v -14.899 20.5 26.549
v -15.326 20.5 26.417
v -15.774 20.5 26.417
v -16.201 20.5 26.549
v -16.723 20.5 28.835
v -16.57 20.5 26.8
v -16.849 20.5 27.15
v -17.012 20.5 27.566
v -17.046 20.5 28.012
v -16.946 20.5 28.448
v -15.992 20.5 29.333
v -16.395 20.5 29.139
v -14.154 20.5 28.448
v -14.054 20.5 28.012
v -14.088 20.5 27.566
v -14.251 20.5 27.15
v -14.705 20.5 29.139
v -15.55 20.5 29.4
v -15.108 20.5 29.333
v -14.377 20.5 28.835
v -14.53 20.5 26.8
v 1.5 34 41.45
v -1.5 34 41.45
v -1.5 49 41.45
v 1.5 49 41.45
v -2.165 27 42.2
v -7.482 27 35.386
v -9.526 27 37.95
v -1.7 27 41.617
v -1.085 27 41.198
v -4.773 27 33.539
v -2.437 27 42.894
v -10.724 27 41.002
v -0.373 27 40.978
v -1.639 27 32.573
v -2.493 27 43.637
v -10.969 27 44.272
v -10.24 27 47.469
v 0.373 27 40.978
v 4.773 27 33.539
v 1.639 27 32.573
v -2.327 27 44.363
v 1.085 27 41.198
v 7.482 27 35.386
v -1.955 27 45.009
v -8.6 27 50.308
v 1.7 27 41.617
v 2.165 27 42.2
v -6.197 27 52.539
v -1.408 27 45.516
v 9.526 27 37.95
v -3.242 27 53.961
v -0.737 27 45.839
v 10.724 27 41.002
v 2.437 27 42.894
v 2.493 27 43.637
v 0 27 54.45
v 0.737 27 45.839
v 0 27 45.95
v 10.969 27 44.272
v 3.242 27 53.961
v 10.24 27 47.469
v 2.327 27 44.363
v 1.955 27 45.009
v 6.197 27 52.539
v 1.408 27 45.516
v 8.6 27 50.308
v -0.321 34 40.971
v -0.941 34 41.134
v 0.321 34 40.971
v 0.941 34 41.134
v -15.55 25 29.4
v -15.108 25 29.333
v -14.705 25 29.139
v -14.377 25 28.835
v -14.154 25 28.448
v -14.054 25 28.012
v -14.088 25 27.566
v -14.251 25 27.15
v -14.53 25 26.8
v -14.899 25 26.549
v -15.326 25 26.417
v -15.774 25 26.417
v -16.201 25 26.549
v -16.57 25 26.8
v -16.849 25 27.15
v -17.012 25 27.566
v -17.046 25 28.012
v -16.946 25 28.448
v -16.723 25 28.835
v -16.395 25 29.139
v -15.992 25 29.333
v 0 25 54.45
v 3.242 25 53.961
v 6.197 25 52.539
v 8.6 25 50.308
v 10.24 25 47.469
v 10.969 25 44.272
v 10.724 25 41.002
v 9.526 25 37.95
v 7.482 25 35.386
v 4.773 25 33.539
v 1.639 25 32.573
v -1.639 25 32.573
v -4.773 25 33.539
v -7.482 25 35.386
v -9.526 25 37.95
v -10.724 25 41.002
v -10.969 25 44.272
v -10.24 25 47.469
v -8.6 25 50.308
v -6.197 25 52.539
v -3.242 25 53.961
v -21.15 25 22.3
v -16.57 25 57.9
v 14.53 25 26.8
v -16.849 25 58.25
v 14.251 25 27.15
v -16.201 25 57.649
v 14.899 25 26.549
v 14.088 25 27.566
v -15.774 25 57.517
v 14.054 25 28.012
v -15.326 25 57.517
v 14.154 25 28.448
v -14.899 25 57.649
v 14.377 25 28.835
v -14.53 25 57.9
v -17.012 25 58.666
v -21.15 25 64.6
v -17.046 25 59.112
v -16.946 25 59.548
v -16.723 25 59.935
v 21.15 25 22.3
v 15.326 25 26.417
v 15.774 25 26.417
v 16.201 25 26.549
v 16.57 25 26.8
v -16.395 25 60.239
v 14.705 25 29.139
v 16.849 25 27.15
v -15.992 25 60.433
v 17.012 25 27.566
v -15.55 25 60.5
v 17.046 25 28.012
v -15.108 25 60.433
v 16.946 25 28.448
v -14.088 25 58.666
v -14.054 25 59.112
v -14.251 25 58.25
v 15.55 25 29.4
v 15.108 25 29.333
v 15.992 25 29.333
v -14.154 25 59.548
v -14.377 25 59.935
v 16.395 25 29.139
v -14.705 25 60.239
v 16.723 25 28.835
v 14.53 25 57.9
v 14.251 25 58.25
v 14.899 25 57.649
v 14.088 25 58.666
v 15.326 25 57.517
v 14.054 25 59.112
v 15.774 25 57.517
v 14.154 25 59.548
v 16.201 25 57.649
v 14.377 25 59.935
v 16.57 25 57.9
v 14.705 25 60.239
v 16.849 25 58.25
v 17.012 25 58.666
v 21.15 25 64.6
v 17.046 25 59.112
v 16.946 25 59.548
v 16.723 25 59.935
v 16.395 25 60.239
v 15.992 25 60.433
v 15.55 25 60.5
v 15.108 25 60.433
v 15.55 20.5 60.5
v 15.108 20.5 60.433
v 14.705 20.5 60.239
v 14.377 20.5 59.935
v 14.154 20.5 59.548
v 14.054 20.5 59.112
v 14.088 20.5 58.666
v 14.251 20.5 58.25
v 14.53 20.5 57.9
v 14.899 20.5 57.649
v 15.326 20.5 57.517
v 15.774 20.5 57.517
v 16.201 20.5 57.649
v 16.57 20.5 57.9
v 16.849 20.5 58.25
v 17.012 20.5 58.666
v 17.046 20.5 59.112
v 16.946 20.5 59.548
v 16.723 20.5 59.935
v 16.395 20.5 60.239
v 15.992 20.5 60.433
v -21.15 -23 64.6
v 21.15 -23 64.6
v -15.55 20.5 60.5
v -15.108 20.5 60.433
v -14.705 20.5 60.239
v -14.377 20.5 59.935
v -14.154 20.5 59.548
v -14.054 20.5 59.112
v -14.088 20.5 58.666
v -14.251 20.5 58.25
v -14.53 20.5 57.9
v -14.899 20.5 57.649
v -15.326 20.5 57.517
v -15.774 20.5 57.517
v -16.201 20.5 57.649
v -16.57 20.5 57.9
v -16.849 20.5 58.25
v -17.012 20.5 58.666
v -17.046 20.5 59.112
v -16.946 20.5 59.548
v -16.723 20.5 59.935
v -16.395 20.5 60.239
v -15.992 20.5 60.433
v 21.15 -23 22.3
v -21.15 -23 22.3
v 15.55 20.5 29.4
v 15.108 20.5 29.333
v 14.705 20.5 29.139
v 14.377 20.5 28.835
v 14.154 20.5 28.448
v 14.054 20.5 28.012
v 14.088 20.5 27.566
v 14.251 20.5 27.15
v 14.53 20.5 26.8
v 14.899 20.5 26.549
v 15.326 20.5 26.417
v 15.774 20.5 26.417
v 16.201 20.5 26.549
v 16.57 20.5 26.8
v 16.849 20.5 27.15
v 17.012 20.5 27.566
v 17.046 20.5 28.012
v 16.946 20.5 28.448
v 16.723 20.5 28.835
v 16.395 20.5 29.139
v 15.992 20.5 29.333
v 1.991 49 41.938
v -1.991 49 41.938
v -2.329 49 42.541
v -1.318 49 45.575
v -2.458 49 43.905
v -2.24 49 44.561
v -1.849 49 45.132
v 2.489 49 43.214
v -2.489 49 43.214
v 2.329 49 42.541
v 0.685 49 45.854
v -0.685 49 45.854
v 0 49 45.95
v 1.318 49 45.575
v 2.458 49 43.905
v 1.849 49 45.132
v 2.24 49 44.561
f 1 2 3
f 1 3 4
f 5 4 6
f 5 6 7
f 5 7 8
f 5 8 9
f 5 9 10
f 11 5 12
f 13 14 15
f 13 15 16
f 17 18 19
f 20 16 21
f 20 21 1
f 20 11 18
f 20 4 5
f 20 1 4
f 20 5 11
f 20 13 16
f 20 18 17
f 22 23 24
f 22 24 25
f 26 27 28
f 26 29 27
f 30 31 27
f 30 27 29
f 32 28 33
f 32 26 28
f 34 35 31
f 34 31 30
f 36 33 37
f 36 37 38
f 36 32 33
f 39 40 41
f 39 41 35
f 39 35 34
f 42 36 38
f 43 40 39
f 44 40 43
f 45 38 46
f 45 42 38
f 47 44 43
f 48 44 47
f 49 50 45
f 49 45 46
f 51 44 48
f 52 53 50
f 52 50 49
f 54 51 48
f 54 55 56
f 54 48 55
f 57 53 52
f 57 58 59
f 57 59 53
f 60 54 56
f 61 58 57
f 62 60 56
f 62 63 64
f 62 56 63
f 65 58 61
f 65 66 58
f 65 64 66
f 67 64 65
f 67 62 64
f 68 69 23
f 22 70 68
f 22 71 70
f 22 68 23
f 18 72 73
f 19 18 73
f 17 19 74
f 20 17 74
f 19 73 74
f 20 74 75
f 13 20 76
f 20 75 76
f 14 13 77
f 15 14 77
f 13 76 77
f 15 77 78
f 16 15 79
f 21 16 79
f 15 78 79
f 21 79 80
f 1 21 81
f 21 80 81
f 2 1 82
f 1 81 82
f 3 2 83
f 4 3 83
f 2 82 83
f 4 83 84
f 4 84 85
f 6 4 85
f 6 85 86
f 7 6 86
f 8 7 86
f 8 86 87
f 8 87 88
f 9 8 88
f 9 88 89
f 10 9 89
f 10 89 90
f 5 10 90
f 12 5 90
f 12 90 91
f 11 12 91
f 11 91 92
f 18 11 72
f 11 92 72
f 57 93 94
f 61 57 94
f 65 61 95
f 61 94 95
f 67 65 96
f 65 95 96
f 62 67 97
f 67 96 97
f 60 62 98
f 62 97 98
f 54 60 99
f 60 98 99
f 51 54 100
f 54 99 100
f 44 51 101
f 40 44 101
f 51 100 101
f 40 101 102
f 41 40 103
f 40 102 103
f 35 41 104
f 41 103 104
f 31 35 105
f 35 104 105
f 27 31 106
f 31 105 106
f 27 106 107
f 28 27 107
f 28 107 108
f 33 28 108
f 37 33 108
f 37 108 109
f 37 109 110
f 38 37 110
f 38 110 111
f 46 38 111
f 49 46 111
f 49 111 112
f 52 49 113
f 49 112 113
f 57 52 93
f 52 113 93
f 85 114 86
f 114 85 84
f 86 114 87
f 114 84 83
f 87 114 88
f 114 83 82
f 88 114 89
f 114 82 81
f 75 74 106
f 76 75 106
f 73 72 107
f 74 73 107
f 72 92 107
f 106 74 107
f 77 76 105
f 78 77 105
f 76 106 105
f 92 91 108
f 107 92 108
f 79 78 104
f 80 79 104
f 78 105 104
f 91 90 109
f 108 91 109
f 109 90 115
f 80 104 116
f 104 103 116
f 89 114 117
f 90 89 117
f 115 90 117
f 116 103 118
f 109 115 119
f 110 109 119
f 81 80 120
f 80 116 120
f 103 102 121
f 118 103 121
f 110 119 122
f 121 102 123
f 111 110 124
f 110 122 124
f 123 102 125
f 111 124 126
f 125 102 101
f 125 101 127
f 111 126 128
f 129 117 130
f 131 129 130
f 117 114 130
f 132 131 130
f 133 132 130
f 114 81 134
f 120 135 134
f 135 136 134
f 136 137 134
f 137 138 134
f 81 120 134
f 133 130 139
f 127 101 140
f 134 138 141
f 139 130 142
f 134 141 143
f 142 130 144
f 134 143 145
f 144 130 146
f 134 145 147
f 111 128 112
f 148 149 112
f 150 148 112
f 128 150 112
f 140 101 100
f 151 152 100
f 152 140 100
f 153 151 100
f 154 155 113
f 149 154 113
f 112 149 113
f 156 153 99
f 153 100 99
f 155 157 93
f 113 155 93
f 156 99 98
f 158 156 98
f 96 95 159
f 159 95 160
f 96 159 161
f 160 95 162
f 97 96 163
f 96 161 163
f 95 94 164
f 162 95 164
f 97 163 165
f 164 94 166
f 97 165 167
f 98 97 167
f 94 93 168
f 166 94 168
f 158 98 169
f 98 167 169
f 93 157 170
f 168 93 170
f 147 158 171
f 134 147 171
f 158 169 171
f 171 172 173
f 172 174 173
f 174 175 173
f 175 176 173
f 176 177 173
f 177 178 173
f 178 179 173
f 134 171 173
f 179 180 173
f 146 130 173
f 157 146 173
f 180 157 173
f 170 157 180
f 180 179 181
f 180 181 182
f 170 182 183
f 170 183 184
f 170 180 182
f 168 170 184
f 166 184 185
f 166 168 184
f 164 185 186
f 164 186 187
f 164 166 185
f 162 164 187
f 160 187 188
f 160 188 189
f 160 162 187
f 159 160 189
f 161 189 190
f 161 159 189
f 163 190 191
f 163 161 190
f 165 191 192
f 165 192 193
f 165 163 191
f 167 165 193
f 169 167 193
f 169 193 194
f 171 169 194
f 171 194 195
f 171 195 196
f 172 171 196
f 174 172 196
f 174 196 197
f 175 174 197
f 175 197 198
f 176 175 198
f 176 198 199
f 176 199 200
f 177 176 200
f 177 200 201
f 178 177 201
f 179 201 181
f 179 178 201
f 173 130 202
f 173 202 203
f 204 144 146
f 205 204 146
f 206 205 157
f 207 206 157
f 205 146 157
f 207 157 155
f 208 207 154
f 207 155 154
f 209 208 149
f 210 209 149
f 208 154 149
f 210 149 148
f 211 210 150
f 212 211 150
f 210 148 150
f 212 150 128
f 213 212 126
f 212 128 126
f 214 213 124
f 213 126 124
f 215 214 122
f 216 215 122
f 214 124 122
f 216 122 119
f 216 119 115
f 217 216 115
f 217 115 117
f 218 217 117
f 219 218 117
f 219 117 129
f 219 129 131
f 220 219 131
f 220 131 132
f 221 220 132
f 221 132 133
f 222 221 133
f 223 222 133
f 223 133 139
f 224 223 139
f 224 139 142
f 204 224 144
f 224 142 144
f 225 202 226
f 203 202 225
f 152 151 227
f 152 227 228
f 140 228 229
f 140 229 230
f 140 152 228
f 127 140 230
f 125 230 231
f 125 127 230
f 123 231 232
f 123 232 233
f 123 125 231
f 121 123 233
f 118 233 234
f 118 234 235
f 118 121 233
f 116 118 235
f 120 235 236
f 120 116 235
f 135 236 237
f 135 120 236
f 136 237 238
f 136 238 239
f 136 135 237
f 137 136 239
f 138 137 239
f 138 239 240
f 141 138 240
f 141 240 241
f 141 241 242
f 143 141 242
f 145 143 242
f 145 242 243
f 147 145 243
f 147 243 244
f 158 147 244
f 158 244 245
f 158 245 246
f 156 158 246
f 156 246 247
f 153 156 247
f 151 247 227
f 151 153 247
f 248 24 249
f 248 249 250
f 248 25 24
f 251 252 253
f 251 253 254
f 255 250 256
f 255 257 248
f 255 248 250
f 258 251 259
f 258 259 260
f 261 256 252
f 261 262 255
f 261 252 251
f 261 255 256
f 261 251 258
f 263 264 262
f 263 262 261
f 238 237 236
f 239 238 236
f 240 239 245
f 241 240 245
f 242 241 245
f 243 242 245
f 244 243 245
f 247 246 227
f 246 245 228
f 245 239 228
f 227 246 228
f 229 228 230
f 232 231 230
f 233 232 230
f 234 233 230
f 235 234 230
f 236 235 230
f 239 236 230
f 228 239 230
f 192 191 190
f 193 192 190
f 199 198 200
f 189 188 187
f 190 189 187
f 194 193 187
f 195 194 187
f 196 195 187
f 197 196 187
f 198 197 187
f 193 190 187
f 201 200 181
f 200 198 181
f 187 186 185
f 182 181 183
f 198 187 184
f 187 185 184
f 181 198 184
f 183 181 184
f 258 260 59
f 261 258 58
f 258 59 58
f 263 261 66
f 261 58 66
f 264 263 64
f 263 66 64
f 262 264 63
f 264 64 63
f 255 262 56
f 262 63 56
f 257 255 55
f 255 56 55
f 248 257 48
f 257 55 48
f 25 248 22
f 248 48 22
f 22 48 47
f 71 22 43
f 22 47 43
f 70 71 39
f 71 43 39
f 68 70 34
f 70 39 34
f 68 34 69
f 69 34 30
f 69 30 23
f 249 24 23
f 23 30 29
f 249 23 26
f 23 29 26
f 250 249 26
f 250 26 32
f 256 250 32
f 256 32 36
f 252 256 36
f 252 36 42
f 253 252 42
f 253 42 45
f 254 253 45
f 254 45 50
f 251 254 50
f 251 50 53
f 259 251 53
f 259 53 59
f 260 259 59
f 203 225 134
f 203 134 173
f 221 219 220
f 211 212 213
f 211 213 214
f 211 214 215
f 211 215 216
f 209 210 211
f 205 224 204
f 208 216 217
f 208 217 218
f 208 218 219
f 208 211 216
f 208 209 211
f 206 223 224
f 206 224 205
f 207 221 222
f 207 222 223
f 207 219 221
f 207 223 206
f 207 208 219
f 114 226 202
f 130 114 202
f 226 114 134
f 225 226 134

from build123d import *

# Parameters (mm, degrees)
SKIZZE1_W                       = 42.3
SKIZZE1_H                       = 42.3
AUFSATZ_LINEAR_AUSTRAGEN1_DEPTH = 48
SKIZZE2_R                       = 11
AUFSATZ_LINEAR_AUSTRAGEN2_DEPTH = 2
SKIZZE3_R                       = 2.5
AUFSATZ_LINEAR_AUSTRAGEN3_DEPTH = 22
SKIZZE4_W                       = 5
SKIZZE4_H                       = 0.5
SCHNITT_LINEAR_AUSTRAGEN1_DEPTH = 15
SKIZZE6_R                       = 1.5
SCHNITT_LINEAR_AUSTRAGEN2_DEPTH = 4.5


with BuildPart() as part:
    # Skizze1 → Aufsatz-Linear austragen1 (new body)
    with BuildSketch(Plane.XZ.offset(-25)):
        with Locations((0, 43.45)):
            Rectangle(SKIZZE1_W, SKIZZE1_H)
    extrude(amount=AUFSATZ_LINEAR_AUSTRAGEN1_DEPTH)

    # Skizze2 → Aufsatz-Linear austragen2 (add)
    with BuildSketch(Plane(origin=(0, 25, 0), x_dir=(1, 0, 0), z_dir=(0, 1, 0))):
        with Locations((0, -43.45)):
            Circle(SKIZZE2_R)
    extrude(amount=AUFSATZ_LINEAR_AUSTRAGEN2_DEPTH)

    # Skizze3 → Aufsatz-Linear austragen3 (add)
    with BuildSketch(Plane(origin=(0, 27, 0), x_dir=(1, 0, 0), z_dir=(0, 1, 0))):
        with Locations((0, -43.45)):
            Circle(SKIZZE3_R)
    extrude(amount=AUFSATZ_LINEAR_AUSTRAGEN3_DEPTH)

    # Skizze4 → Schnitt-Linear austragen1 (cut)
    with BuildSketch(Plane(origin=(0, 49, 0), x_dir=(1, 0, 0), z_dir=(0, 1, 0))):
        with Locations((0, -41.2)):
            Rectangle(SKIZZE4_W, SKIZZE4_H)
    extrude(amount=-SCHNITT_LINEAR_AUSTRAGEN1_DEPTH, mode=Mode.SUBTRACT)

    # Skizze6 → Schnitt-Linear austragen2 (cut)
    with BuildSketch(Plane(origin=(0, 25, 0), x_dir=(1, 0, 0), z_dir=(0, 1, 0))):
        with Locations((-15.55, -27.9)):
            Circle(SKIZZE6_R)
        with Locations((-15.55, -59)):
            Circle(SKIZZE6_R)
    schnitt_linear_austragen2 = extrude(amount=-SCHNITT_LINEAR_AUSTRAGEN2_DEPTH, mode=Mode.SUBTRACT)

    # Spiegeln1: Schnitt-Linear austragen2 across plane
    add(schnitt_linear_austragen2.mirror(Plane.ZY), mode=Mode.SUBTRACT)


solid = part.part
